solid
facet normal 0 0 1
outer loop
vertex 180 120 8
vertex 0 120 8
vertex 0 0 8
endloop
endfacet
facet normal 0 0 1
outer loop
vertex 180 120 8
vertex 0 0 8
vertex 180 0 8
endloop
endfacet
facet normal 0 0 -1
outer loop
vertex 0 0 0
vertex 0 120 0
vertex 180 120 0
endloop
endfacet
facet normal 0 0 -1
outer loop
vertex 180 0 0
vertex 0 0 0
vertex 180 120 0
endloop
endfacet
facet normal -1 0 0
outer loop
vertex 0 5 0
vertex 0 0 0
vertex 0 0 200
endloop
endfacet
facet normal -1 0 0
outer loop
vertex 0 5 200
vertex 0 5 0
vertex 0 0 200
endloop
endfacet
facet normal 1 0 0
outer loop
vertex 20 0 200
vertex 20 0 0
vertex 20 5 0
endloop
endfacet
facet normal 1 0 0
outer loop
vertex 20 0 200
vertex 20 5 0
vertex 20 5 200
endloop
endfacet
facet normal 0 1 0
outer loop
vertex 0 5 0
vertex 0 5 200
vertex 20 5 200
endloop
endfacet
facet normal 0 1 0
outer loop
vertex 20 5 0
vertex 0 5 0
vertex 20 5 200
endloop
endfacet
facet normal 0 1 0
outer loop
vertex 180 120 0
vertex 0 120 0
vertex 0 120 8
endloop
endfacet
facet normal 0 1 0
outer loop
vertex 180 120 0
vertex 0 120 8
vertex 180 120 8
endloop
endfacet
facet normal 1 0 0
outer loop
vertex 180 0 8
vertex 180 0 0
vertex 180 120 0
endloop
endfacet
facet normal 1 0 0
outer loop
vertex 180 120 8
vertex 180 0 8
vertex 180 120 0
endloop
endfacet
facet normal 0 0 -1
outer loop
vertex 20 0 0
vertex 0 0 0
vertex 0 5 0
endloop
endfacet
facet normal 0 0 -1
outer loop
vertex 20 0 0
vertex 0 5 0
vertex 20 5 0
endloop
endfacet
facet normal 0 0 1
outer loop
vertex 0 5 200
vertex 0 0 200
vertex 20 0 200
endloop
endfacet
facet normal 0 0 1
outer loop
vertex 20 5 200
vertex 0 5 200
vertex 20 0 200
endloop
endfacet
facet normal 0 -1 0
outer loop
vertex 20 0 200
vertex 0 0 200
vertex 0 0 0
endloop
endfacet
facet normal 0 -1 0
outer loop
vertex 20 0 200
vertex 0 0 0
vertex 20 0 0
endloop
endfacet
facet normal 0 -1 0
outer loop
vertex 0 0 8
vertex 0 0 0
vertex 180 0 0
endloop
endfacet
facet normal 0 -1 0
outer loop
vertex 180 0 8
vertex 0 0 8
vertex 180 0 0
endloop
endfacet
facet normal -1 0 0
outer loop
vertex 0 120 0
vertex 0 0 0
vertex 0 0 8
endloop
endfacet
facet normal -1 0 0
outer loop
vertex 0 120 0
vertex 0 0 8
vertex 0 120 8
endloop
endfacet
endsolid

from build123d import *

# Parameters (mm, degrees)
F0_W     = 180
F0_H     = 120
F1_DEPTH = 8
F2_W     = 20
F2_H     = 200
F3_DEPTH = 5


with BuildPart() as f1:
    # F0 (on Top) → F1 (new body)
    with BuildSketch(Plane.XY):
        with Locations((90, 60)):
            Rectangle(F0_W, F0_H)
    extrude(amount=F1_DEPTH)


with BuildPart() as f3:
    # F2 (on Front) → F3 (new body)
    with BuildSketch(Plane.XZ):
        with Locations((10, 100)):
            Rectangle(F2_W, F2_H)
    extrude(amount=-F3_DEPTH)


solid = Compound([f1.part, f3.part])
